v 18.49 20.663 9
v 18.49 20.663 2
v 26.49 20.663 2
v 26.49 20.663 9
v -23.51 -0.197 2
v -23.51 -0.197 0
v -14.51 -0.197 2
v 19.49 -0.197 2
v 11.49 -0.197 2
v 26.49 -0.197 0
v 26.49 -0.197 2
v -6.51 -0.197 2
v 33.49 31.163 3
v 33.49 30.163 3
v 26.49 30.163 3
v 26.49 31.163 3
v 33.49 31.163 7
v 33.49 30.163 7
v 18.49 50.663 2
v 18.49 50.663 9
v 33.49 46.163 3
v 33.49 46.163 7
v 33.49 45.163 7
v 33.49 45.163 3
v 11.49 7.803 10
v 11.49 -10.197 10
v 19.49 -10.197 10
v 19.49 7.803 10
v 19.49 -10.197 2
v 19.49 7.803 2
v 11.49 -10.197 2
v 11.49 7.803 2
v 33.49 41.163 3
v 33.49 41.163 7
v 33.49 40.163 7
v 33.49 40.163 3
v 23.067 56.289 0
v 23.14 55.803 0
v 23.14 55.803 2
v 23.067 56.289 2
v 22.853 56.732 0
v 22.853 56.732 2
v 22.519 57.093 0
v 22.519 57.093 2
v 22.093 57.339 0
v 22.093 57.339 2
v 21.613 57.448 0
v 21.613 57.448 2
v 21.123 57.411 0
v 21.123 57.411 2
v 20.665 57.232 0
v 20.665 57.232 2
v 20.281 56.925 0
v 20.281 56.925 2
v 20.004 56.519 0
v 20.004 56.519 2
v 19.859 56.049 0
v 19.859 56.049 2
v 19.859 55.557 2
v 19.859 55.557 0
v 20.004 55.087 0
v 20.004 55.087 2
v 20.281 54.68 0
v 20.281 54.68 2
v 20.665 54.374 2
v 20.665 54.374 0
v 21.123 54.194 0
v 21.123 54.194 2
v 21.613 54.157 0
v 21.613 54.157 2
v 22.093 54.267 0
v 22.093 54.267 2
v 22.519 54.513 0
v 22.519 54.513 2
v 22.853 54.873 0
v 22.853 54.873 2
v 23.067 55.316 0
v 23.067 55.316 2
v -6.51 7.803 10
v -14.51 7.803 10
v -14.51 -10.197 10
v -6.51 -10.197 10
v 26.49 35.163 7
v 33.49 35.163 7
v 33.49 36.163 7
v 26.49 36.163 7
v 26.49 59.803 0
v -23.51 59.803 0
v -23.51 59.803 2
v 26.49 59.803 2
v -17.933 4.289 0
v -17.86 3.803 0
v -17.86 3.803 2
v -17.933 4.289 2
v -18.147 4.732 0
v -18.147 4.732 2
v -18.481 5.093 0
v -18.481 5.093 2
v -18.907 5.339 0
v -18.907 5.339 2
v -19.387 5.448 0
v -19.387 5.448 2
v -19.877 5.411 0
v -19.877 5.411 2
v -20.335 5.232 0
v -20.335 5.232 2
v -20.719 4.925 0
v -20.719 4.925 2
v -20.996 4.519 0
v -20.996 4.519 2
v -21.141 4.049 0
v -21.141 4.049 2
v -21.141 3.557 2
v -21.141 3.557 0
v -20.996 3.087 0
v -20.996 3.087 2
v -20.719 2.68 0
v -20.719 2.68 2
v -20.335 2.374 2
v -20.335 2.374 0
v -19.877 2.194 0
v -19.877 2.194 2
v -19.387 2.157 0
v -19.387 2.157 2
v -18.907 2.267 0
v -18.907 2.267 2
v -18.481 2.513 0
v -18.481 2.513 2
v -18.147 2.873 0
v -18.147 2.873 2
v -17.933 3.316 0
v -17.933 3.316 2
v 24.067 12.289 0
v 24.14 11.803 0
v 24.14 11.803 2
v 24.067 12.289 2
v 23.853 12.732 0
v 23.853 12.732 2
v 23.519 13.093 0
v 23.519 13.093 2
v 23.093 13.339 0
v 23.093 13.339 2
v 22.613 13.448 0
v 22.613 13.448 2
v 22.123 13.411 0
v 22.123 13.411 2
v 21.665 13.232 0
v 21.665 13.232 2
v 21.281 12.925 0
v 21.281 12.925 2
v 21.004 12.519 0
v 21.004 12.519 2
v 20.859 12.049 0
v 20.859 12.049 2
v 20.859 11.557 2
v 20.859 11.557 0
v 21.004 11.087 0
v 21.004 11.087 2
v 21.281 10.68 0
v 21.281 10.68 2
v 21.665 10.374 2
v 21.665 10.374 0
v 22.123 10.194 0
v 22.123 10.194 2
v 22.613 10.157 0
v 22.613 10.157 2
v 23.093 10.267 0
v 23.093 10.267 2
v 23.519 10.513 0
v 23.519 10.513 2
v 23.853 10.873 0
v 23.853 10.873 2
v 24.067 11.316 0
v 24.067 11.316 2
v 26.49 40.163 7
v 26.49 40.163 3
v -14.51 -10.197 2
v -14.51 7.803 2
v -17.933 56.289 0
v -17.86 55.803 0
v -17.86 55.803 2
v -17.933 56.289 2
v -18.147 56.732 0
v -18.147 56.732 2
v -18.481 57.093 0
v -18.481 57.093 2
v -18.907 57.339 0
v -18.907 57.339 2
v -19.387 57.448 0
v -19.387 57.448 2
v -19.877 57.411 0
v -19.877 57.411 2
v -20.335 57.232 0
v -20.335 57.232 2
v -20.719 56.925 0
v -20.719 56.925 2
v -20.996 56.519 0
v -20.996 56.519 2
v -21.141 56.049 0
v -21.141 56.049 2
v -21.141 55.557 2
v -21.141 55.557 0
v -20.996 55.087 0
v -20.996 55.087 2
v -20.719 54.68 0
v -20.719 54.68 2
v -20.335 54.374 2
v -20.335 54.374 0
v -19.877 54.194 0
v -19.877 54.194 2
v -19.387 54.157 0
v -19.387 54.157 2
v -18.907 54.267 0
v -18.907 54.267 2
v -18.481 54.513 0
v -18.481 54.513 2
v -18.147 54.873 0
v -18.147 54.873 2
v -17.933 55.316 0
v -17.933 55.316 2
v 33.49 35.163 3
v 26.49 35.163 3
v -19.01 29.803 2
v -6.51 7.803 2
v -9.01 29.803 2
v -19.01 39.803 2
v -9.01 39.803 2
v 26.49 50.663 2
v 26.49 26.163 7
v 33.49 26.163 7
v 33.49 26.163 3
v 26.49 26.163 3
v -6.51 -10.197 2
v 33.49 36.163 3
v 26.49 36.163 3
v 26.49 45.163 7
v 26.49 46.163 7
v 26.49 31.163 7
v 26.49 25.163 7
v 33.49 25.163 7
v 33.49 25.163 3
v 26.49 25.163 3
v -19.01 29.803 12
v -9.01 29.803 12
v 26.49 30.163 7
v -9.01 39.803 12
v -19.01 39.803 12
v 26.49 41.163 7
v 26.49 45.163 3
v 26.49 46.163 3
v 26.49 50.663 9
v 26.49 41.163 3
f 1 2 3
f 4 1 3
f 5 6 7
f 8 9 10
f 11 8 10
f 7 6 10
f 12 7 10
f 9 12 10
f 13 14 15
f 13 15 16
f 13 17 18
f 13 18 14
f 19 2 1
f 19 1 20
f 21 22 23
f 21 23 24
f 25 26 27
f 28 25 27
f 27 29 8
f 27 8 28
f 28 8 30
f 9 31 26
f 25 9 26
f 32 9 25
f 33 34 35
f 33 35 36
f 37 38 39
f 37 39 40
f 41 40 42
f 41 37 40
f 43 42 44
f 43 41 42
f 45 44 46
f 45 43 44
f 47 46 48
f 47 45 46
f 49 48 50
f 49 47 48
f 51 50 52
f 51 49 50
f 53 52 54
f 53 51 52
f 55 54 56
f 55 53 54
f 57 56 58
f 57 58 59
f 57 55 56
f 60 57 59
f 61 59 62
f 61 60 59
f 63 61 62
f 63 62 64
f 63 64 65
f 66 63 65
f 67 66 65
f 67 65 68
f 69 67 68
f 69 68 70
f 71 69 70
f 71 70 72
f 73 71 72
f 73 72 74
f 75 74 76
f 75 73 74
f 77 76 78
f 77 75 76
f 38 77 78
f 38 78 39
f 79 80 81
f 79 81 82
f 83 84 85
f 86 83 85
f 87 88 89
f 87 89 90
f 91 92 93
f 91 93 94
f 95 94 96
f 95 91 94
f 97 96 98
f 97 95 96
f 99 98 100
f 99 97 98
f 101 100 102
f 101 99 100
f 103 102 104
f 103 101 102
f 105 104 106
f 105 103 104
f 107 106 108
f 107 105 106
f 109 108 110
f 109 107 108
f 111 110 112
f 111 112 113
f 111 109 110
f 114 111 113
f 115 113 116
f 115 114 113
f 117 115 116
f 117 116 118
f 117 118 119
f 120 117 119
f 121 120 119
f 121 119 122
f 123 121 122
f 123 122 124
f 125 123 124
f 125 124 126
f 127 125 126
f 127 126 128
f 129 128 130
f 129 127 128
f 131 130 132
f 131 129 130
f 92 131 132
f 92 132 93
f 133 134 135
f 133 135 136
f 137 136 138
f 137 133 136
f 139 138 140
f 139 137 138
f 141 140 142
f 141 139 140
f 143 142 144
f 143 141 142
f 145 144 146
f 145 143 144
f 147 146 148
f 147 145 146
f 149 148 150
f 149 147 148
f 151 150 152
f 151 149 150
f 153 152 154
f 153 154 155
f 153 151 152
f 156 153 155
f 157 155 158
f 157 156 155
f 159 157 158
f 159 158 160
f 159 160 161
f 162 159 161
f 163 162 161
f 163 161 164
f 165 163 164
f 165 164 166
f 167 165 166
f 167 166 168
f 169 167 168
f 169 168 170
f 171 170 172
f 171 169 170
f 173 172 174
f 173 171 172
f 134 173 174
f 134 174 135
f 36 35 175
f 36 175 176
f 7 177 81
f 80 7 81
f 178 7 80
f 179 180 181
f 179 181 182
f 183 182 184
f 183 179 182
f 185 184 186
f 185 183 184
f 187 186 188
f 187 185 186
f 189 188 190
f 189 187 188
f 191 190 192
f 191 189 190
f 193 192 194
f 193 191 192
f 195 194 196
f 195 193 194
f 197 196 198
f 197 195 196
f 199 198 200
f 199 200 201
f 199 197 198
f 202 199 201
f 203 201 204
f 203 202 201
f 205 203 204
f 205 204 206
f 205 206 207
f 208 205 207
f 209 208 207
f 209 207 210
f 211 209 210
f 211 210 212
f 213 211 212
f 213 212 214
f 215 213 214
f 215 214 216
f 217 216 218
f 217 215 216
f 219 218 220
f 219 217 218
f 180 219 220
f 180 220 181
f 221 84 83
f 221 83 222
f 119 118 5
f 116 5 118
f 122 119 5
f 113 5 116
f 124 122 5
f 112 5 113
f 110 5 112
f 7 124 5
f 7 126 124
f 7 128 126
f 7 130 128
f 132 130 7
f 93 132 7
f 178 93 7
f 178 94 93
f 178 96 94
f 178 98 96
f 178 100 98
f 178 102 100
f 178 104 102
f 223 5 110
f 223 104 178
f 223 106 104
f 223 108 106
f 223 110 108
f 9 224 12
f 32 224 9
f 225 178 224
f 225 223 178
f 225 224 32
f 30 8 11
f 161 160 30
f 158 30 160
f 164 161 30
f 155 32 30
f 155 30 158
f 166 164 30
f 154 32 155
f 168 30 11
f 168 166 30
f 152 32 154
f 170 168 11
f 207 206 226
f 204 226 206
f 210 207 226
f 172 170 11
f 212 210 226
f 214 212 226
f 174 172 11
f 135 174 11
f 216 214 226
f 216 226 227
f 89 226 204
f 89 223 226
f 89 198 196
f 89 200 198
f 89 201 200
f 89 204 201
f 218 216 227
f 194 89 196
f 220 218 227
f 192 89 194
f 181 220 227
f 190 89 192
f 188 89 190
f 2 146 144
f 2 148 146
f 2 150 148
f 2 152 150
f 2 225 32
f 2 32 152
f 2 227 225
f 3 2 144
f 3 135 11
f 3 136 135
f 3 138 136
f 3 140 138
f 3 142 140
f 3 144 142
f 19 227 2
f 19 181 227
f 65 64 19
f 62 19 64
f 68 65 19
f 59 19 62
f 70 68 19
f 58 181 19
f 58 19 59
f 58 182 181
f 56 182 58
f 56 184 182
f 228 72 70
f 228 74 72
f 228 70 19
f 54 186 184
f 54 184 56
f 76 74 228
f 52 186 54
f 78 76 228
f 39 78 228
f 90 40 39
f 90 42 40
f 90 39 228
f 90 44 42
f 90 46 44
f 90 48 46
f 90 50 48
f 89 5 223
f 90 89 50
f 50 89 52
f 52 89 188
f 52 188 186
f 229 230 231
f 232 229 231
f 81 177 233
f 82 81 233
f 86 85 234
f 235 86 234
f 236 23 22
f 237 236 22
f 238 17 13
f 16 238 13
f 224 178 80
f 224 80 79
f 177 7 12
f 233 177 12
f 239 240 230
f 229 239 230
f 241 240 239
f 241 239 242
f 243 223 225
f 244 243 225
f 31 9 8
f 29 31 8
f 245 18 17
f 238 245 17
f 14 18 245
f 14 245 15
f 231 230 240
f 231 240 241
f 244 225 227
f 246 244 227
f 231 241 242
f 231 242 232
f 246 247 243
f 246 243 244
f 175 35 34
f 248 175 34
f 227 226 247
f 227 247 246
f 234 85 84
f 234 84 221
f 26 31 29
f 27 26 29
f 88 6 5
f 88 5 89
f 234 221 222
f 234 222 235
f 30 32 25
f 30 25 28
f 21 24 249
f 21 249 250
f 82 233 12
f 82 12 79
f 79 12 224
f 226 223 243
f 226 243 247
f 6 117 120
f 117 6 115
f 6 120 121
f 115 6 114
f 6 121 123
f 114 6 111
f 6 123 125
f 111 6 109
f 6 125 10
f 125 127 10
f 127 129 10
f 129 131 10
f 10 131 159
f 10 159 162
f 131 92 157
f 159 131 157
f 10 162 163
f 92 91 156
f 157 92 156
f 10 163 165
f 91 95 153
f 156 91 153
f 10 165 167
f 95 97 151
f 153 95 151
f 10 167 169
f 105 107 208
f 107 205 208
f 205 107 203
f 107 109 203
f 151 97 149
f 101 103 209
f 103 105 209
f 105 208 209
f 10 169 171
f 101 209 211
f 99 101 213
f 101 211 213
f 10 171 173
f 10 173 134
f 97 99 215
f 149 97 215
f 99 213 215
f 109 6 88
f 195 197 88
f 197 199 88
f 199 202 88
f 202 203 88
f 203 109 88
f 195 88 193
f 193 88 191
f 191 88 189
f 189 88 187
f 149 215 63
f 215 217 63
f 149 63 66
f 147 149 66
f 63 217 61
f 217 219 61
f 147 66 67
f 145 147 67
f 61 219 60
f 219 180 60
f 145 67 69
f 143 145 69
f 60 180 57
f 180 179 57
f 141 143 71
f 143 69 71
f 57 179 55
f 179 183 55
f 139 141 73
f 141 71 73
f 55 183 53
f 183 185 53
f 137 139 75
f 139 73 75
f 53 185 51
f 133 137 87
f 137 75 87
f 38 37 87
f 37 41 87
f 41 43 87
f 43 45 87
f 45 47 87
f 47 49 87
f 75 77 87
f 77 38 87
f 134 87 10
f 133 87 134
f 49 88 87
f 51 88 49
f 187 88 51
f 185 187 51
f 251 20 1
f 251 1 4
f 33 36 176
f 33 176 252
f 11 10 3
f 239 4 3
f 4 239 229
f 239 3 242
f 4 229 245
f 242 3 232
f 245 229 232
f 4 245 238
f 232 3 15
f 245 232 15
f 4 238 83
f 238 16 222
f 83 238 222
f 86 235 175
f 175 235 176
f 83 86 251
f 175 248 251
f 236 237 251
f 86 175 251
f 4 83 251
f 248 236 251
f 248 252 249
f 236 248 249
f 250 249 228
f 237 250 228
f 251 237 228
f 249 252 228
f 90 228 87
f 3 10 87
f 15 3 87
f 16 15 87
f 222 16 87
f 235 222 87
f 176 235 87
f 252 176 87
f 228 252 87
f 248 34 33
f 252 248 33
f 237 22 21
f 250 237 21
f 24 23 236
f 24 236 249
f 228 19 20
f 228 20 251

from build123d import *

# Parameters (mm, degrees)
ESQUISSE1_W        = 50
ESQUISSE1_H        = 60
ESQUISSE1_R        = 1.65
BOSS_EXTRU_1_DEPTH = 2
ESQUISSE2_W        = 8
ESQUISSE2_H        = 18
BOSS_EXTRU_2_DEPTH = 8
ESQUISSE3_W        = 10
ESQUISSE3_H        = 10
BOSS_EXTRU_3_DEPTH = 10
ESQUISSE4_W        = 8
ESQUISSE4_H        = 30
BOSS_EXTRU_4_DEPTH = 7
ESQUISSE5_W        = 4
ESQUISSE5_H        = 1
BOSS_EXTRU_5_DEPTH = 7


with BuildPart() as part:
    # Esquisse1 → Boss.-Extru.1 (new body)
    with BuildSketch(Plane.XY):
        with Locations((1.490133333, 29.802666667)):
            Rectangle(ESQUISSE1_W, ESQUISSE1_H)
        with Locations((-19.509866667, 55.802666667)):
            Circle(ESQUISSE1_R, mode=Mode.SUBTRACT)
        with Locations((21.490133333, 55.802666667)):
            Circle(ESQUISSE1_R, mode=Mode.SUBTRACT)
        with Locations((22.490133333, 11.802666667)):
            Circle(ESQUISSE1_R, mode=Mode.SUBTRACT)
        with Locations((-19.509866667, 3.802666667)):
            Circle(ESQUISSE1_R, mode=Mode.SUBTRACT)
    extrude(amount=BOSS_EXTRU_1_DEPTH)

    # Esquisse2 → Boss.-Extru.2 (add)
    with BuildSketch(Plane.XY.offset(2)):
        with Locations((-10.509866667, -1.197333333)):
            Rectangle(ESQUISSE2_W, ESQUISSE2_H)
        with Locations((15.490133333, -1.197333333)):
            Rectangle(ESQUISSE2_W, ESQUISSE2_H)
    extrude(amount=BOSS_EXTRU_2_DEPTH)

    # Esquisse3 → Boss.-Extru.3 (add)
    with BuildSketch(Plane.XY.offset(2)):
        with Locations((-14.009866667, 34.802666667)):
            Rectangle(ESQUISSE3_W, ESQUISSE3_H)
    extrude(amount=BOSS_EXTRU_3_DEPTH)

    # Esquisse4 → Boss.-Extru.4 (add)
    with BuildSketch(Plane.XY.offset(2)):
        with Locations((22.490133333, 35.662666667)):
            Rectangle(ESQUISSE4_W, ESQUISSE4_H)
    extrude(amount=BOSS_EXTRU_4_DEPTH)

    # Esquisse5 → Boss.-Extru.5 (add)
    with BuildSketch(Plane(origin=(26.490133333, 0, 0), x_dir=(0, 0, -1), z_dir=(1, 0, 0))):
        with Locations((-5, 35.662666667)):
            Rectangle(ESQUISSE5_W, ESQUISSE5_H)
        with Locations((-5, 40.662666667)):
            Rectangle(ESQUISSE5_W, ESQUISSE5_H)
        with Locations((-5, 45.662666667)):
            Rectangle(ESQUISSE5_W, ESQUISSE5_H)
        with Locations((-5, 30.662666667)):
            Rectangle(ESQUISSE5_W, ESQUISSE5_H)
        with Locations((-5, 25.662666667)):
            Rectangle(ESQUISSE5_W, ESQUISSE5_H)
    extrude(amount=BOSS_EXTRU_5_DEPTH)


solid = part.part
